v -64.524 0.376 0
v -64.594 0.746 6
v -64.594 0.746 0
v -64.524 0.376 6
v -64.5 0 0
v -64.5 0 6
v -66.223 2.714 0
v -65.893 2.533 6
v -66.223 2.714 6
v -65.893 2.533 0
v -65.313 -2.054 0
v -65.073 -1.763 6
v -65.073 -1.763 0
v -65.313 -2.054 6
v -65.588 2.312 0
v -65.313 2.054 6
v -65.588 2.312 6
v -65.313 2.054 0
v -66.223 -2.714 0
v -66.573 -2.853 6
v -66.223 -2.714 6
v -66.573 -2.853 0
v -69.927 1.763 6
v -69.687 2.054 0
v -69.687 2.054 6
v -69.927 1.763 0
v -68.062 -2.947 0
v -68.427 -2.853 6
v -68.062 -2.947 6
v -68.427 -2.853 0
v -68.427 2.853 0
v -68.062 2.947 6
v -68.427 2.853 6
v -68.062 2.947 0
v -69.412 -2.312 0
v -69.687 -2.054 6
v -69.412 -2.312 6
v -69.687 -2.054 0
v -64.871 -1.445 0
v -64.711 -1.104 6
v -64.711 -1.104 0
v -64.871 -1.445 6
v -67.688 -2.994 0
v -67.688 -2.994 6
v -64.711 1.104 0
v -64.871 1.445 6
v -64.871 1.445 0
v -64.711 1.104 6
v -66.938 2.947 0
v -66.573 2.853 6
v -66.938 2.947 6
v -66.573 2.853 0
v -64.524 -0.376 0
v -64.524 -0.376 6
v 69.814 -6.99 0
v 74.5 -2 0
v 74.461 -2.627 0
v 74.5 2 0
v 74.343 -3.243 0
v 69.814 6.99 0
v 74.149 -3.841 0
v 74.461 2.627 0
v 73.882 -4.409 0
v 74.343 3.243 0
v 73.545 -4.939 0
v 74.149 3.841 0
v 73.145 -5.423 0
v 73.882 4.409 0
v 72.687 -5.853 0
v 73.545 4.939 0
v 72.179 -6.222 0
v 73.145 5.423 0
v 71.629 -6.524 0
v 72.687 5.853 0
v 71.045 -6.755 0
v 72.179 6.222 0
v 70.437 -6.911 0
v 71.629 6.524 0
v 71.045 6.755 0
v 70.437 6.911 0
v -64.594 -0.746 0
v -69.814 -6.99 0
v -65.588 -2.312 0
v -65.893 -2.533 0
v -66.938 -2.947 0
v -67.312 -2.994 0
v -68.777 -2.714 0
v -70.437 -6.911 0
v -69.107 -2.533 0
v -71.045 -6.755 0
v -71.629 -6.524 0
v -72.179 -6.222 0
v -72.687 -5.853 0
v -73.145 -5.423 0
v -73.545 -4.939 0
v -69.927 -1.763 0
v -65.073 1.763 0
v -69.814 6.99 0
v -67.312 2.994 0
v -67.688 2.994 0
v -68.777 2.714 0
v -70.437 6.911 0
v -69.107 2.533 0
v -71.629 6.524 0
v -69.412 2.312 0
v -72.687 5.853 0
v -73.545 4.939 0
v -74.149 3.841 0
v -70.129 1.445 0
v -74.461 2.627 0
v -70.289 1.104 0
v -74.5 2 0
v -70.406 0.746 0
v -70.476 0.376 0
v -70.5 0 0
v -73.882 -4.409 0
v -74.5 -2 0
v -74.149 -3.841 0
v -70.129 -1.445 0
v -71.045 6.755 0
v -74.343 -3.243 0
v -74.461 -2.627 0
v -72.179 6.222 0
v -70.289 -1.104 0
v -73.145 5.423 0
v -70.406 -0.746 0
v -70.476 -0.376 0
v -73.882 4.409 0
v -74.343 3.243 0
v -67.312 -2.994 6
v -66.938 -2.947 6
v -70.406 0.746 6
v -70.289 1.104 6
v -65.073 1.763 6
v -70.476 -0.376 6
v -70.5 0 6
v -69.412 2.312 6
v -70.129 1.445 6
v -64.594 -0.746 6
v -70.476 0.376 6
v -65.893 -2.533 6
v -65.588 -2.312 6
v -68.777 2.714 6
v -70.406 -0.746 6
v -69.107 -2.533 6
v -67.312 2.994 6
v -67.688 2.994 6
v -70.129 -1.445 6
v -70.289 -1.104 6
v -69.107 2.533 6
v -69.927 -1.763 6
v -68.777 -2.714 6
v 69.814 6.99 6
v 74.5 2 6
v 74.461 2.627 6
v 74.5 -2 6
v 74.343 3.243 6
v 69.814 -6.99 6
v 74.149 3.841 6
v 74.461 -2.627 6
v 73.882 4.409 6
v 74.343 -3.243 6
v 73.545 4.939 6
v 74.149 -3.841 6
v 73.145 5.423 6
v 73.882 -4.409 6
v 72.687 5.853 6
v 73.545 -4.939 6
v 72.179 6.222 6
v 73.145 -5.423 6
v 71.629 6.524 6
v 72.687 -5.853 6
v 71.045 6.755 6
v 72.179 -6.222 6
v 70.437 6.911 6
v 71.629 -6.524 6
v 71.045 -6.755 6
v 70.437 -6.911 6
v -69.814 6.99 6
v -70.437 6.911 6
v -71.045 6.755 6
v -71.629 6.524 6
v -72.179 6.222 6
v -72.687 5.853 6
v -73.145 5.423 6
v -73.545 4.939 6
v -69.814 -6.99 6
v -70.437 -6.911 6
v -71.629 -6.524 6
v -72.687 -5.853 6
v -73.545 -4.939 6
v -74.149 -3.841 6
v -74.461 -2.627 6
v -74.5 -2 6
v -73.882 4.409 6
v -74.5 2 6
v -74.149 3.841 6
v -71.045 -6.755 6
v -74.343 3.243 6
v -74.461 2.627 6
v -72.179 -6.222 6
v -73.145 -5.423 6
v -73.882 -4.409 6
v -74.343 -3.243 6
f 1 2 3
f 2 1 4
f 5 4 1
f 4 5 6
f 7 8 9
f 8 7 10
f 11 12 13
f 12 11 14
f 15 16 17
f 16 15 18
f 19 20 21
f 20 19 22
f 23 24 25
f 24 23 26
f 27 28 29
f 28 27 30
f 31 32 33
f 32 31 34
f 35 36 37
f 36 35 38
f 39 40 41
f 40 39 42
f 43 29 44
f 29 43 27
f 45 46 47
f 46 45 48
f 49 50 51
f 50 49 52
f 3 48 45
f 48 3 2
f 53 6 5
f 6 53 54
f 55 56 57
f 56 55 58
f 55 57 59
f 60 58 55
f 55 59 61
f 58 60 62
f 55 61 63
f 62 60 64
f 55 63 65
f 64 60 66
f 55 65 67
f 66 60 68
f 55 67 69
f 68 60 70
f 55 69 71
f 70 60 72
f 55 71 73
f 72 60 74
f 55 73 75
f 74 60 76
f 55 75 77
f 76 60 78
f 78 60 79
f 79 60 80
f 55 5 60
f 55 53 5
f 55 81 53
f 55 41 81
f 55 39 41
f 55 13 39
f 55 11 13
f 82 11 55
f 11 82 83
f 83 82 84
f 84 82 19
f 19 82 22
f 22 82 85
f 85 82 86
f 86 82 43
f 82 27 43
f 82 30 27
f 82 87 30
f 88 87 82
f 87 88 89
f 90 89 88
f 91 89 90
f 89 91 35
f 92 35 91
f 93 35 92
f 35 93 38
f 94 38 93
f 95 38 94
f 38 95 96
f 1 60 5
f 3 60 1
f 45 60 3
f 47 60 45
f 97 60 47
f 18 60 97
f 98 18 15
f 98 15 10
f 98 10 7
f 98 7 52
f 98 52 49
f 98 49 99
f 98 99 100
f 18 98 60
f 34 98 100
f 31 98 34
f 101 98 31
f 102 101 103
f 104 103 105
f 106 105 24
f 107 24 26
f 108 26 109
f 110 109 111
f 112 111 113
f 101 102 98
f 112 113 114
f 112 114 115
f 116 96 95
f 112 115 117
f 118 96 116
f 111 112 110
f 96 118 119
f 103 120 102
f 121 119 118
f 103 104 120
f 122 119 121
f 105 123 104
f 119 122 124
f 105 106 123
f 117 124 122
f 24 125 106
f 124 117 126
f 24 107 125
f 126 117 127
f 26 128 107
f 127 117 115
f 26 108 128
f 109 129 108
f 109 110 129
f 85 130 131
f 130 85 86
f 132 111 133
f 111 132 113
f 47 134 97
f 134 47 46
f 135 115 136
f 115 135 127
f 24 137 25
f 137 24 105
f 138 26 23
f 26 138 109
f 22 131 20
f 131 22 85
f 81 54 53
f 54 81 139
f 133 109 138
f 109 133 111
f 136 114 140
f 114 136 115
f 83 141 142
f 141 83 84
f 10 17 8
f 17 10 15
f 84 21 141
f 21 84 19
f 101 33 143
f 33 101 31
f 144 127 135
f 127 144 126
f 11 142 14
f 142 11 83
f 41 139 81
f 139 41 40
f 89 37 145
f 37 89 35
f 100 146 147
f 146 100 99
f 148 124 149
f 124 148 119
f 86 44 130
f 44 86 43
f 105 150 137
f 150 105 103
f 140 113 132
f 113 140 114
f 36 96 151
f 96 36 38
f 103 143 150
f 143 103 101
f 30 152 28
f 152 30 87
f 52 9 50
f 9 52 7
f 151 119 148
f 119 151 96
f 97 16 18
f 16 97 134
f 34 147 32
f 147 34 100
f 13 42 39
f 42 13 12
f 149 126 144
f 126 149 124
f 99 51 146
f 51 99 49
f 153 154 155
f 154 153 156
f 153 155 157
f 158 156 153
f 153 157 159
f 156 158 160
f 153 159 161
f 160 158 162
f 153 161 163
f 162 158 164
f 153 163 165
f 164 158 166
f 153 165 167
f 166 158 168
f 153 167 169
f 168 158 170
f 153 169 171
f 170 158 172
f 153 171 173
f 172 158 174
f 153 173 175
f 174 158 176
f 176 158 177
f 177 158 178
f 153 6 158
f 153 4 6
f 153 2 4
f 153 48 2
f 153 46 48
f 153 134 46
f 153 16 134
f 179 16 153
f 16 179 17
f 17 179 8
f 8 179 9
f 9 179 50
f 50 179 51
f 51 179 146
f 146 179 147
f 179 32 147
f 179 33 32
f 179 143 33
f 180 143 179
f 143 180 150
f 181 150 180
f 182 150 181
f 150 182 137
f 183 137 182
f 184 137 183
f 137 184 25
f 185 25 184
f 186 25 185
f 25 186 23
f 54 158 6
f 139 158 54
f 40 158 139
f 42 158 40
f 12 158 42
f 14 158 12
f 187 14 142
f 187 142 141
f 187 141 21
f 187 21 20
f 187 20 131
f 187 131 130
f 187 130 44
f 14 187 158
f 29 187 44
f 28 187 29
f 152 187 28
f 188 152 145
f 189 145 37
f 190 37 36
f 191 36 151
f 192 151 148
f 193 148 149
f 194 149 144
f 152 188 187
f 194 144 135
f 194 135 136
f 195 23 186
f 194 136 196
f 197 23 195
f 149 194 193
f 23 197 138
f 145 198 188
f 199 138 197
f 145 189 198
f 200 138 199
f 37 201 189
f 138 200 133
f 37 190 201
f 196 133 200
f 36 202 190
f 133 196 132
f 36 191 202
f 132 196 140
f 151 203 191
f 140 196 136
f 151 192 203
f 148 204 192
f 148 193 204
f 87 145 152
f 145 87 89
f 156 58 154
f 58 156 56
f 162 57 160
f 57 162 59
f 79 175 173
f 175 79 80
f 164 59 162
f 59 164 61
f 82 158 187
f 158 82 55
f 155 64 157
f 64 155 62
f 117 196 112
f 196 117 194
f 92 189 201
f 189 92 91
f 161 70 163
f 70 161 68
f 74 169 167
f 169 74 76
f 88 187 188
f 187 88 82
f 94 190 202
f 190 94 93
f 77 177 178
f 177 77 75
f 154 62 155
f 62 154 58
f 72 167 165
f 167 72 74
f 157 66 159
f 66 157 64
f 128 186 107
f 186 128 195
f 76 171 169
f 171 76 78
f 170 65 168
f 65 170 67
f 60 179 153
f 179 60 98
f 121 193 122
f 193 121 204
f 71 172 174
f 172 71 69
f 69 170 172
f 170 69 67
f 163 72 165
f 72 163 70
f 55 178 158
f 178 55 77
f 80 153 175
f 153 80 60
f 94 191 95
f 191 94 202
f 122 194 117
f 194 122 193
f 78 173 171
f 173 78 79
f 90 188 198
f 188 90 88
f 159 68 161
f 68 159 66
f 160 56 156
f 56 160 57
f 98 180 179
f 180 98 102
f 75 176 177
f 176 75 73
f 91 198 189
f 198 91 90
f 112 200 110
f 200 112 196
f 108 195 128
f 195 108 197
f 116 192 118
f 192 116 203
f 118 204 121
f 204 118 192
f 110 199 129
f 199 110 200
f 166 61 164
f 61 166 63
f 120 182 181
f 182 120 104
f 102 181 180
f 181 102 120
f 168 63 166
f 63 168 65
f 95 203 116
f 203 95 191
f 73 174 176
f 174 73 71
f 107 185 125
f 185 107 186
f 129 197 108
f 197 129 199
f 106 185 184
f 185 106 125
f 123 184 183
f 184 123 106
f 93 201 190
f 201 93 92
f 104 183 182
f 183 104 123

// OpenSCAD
$fn = 50;


difference() {
	union() {
		hull() {
			translate(v = [-69.5000000000, 2.0000000000, 0]) {
				cylinder(h = 6, r = 5);
			}
			translate(v = [69.5000000000, 2.0000000000, 0]) {
				cylinder(h = 6, r = 5);
			}
			translate(v = [-69.5000000000, -2.0000000000, 0]) {
				cylinder(h = 6, r = 5);
			}
			translate(v = [69.5000000000, -2.0000000000, 0]) {
				cylinder(h = 6, r = 5);
			}
		}
	}
	union() {
		translate(v = [-67.5000000000, 0.0000000000, 0]) {
			cylinder(h = 6, r = 3.0000000000);
		}
		translate(v = [-67.5000000000, 0.0000000000, 0]) {
			cylinder(h = 6, r = 1.5000000000);
		}
		translate(v = [-67.5000000000, 0.0000000000, 0]) {
			cylinder(h = 6, r = 1.5000000000);
		}
		translate(v = [-67.5000000000, 0.0000000000, 0]) {
			cylinder(h = 6, r = 1.5000000000);
		}
	}
}
